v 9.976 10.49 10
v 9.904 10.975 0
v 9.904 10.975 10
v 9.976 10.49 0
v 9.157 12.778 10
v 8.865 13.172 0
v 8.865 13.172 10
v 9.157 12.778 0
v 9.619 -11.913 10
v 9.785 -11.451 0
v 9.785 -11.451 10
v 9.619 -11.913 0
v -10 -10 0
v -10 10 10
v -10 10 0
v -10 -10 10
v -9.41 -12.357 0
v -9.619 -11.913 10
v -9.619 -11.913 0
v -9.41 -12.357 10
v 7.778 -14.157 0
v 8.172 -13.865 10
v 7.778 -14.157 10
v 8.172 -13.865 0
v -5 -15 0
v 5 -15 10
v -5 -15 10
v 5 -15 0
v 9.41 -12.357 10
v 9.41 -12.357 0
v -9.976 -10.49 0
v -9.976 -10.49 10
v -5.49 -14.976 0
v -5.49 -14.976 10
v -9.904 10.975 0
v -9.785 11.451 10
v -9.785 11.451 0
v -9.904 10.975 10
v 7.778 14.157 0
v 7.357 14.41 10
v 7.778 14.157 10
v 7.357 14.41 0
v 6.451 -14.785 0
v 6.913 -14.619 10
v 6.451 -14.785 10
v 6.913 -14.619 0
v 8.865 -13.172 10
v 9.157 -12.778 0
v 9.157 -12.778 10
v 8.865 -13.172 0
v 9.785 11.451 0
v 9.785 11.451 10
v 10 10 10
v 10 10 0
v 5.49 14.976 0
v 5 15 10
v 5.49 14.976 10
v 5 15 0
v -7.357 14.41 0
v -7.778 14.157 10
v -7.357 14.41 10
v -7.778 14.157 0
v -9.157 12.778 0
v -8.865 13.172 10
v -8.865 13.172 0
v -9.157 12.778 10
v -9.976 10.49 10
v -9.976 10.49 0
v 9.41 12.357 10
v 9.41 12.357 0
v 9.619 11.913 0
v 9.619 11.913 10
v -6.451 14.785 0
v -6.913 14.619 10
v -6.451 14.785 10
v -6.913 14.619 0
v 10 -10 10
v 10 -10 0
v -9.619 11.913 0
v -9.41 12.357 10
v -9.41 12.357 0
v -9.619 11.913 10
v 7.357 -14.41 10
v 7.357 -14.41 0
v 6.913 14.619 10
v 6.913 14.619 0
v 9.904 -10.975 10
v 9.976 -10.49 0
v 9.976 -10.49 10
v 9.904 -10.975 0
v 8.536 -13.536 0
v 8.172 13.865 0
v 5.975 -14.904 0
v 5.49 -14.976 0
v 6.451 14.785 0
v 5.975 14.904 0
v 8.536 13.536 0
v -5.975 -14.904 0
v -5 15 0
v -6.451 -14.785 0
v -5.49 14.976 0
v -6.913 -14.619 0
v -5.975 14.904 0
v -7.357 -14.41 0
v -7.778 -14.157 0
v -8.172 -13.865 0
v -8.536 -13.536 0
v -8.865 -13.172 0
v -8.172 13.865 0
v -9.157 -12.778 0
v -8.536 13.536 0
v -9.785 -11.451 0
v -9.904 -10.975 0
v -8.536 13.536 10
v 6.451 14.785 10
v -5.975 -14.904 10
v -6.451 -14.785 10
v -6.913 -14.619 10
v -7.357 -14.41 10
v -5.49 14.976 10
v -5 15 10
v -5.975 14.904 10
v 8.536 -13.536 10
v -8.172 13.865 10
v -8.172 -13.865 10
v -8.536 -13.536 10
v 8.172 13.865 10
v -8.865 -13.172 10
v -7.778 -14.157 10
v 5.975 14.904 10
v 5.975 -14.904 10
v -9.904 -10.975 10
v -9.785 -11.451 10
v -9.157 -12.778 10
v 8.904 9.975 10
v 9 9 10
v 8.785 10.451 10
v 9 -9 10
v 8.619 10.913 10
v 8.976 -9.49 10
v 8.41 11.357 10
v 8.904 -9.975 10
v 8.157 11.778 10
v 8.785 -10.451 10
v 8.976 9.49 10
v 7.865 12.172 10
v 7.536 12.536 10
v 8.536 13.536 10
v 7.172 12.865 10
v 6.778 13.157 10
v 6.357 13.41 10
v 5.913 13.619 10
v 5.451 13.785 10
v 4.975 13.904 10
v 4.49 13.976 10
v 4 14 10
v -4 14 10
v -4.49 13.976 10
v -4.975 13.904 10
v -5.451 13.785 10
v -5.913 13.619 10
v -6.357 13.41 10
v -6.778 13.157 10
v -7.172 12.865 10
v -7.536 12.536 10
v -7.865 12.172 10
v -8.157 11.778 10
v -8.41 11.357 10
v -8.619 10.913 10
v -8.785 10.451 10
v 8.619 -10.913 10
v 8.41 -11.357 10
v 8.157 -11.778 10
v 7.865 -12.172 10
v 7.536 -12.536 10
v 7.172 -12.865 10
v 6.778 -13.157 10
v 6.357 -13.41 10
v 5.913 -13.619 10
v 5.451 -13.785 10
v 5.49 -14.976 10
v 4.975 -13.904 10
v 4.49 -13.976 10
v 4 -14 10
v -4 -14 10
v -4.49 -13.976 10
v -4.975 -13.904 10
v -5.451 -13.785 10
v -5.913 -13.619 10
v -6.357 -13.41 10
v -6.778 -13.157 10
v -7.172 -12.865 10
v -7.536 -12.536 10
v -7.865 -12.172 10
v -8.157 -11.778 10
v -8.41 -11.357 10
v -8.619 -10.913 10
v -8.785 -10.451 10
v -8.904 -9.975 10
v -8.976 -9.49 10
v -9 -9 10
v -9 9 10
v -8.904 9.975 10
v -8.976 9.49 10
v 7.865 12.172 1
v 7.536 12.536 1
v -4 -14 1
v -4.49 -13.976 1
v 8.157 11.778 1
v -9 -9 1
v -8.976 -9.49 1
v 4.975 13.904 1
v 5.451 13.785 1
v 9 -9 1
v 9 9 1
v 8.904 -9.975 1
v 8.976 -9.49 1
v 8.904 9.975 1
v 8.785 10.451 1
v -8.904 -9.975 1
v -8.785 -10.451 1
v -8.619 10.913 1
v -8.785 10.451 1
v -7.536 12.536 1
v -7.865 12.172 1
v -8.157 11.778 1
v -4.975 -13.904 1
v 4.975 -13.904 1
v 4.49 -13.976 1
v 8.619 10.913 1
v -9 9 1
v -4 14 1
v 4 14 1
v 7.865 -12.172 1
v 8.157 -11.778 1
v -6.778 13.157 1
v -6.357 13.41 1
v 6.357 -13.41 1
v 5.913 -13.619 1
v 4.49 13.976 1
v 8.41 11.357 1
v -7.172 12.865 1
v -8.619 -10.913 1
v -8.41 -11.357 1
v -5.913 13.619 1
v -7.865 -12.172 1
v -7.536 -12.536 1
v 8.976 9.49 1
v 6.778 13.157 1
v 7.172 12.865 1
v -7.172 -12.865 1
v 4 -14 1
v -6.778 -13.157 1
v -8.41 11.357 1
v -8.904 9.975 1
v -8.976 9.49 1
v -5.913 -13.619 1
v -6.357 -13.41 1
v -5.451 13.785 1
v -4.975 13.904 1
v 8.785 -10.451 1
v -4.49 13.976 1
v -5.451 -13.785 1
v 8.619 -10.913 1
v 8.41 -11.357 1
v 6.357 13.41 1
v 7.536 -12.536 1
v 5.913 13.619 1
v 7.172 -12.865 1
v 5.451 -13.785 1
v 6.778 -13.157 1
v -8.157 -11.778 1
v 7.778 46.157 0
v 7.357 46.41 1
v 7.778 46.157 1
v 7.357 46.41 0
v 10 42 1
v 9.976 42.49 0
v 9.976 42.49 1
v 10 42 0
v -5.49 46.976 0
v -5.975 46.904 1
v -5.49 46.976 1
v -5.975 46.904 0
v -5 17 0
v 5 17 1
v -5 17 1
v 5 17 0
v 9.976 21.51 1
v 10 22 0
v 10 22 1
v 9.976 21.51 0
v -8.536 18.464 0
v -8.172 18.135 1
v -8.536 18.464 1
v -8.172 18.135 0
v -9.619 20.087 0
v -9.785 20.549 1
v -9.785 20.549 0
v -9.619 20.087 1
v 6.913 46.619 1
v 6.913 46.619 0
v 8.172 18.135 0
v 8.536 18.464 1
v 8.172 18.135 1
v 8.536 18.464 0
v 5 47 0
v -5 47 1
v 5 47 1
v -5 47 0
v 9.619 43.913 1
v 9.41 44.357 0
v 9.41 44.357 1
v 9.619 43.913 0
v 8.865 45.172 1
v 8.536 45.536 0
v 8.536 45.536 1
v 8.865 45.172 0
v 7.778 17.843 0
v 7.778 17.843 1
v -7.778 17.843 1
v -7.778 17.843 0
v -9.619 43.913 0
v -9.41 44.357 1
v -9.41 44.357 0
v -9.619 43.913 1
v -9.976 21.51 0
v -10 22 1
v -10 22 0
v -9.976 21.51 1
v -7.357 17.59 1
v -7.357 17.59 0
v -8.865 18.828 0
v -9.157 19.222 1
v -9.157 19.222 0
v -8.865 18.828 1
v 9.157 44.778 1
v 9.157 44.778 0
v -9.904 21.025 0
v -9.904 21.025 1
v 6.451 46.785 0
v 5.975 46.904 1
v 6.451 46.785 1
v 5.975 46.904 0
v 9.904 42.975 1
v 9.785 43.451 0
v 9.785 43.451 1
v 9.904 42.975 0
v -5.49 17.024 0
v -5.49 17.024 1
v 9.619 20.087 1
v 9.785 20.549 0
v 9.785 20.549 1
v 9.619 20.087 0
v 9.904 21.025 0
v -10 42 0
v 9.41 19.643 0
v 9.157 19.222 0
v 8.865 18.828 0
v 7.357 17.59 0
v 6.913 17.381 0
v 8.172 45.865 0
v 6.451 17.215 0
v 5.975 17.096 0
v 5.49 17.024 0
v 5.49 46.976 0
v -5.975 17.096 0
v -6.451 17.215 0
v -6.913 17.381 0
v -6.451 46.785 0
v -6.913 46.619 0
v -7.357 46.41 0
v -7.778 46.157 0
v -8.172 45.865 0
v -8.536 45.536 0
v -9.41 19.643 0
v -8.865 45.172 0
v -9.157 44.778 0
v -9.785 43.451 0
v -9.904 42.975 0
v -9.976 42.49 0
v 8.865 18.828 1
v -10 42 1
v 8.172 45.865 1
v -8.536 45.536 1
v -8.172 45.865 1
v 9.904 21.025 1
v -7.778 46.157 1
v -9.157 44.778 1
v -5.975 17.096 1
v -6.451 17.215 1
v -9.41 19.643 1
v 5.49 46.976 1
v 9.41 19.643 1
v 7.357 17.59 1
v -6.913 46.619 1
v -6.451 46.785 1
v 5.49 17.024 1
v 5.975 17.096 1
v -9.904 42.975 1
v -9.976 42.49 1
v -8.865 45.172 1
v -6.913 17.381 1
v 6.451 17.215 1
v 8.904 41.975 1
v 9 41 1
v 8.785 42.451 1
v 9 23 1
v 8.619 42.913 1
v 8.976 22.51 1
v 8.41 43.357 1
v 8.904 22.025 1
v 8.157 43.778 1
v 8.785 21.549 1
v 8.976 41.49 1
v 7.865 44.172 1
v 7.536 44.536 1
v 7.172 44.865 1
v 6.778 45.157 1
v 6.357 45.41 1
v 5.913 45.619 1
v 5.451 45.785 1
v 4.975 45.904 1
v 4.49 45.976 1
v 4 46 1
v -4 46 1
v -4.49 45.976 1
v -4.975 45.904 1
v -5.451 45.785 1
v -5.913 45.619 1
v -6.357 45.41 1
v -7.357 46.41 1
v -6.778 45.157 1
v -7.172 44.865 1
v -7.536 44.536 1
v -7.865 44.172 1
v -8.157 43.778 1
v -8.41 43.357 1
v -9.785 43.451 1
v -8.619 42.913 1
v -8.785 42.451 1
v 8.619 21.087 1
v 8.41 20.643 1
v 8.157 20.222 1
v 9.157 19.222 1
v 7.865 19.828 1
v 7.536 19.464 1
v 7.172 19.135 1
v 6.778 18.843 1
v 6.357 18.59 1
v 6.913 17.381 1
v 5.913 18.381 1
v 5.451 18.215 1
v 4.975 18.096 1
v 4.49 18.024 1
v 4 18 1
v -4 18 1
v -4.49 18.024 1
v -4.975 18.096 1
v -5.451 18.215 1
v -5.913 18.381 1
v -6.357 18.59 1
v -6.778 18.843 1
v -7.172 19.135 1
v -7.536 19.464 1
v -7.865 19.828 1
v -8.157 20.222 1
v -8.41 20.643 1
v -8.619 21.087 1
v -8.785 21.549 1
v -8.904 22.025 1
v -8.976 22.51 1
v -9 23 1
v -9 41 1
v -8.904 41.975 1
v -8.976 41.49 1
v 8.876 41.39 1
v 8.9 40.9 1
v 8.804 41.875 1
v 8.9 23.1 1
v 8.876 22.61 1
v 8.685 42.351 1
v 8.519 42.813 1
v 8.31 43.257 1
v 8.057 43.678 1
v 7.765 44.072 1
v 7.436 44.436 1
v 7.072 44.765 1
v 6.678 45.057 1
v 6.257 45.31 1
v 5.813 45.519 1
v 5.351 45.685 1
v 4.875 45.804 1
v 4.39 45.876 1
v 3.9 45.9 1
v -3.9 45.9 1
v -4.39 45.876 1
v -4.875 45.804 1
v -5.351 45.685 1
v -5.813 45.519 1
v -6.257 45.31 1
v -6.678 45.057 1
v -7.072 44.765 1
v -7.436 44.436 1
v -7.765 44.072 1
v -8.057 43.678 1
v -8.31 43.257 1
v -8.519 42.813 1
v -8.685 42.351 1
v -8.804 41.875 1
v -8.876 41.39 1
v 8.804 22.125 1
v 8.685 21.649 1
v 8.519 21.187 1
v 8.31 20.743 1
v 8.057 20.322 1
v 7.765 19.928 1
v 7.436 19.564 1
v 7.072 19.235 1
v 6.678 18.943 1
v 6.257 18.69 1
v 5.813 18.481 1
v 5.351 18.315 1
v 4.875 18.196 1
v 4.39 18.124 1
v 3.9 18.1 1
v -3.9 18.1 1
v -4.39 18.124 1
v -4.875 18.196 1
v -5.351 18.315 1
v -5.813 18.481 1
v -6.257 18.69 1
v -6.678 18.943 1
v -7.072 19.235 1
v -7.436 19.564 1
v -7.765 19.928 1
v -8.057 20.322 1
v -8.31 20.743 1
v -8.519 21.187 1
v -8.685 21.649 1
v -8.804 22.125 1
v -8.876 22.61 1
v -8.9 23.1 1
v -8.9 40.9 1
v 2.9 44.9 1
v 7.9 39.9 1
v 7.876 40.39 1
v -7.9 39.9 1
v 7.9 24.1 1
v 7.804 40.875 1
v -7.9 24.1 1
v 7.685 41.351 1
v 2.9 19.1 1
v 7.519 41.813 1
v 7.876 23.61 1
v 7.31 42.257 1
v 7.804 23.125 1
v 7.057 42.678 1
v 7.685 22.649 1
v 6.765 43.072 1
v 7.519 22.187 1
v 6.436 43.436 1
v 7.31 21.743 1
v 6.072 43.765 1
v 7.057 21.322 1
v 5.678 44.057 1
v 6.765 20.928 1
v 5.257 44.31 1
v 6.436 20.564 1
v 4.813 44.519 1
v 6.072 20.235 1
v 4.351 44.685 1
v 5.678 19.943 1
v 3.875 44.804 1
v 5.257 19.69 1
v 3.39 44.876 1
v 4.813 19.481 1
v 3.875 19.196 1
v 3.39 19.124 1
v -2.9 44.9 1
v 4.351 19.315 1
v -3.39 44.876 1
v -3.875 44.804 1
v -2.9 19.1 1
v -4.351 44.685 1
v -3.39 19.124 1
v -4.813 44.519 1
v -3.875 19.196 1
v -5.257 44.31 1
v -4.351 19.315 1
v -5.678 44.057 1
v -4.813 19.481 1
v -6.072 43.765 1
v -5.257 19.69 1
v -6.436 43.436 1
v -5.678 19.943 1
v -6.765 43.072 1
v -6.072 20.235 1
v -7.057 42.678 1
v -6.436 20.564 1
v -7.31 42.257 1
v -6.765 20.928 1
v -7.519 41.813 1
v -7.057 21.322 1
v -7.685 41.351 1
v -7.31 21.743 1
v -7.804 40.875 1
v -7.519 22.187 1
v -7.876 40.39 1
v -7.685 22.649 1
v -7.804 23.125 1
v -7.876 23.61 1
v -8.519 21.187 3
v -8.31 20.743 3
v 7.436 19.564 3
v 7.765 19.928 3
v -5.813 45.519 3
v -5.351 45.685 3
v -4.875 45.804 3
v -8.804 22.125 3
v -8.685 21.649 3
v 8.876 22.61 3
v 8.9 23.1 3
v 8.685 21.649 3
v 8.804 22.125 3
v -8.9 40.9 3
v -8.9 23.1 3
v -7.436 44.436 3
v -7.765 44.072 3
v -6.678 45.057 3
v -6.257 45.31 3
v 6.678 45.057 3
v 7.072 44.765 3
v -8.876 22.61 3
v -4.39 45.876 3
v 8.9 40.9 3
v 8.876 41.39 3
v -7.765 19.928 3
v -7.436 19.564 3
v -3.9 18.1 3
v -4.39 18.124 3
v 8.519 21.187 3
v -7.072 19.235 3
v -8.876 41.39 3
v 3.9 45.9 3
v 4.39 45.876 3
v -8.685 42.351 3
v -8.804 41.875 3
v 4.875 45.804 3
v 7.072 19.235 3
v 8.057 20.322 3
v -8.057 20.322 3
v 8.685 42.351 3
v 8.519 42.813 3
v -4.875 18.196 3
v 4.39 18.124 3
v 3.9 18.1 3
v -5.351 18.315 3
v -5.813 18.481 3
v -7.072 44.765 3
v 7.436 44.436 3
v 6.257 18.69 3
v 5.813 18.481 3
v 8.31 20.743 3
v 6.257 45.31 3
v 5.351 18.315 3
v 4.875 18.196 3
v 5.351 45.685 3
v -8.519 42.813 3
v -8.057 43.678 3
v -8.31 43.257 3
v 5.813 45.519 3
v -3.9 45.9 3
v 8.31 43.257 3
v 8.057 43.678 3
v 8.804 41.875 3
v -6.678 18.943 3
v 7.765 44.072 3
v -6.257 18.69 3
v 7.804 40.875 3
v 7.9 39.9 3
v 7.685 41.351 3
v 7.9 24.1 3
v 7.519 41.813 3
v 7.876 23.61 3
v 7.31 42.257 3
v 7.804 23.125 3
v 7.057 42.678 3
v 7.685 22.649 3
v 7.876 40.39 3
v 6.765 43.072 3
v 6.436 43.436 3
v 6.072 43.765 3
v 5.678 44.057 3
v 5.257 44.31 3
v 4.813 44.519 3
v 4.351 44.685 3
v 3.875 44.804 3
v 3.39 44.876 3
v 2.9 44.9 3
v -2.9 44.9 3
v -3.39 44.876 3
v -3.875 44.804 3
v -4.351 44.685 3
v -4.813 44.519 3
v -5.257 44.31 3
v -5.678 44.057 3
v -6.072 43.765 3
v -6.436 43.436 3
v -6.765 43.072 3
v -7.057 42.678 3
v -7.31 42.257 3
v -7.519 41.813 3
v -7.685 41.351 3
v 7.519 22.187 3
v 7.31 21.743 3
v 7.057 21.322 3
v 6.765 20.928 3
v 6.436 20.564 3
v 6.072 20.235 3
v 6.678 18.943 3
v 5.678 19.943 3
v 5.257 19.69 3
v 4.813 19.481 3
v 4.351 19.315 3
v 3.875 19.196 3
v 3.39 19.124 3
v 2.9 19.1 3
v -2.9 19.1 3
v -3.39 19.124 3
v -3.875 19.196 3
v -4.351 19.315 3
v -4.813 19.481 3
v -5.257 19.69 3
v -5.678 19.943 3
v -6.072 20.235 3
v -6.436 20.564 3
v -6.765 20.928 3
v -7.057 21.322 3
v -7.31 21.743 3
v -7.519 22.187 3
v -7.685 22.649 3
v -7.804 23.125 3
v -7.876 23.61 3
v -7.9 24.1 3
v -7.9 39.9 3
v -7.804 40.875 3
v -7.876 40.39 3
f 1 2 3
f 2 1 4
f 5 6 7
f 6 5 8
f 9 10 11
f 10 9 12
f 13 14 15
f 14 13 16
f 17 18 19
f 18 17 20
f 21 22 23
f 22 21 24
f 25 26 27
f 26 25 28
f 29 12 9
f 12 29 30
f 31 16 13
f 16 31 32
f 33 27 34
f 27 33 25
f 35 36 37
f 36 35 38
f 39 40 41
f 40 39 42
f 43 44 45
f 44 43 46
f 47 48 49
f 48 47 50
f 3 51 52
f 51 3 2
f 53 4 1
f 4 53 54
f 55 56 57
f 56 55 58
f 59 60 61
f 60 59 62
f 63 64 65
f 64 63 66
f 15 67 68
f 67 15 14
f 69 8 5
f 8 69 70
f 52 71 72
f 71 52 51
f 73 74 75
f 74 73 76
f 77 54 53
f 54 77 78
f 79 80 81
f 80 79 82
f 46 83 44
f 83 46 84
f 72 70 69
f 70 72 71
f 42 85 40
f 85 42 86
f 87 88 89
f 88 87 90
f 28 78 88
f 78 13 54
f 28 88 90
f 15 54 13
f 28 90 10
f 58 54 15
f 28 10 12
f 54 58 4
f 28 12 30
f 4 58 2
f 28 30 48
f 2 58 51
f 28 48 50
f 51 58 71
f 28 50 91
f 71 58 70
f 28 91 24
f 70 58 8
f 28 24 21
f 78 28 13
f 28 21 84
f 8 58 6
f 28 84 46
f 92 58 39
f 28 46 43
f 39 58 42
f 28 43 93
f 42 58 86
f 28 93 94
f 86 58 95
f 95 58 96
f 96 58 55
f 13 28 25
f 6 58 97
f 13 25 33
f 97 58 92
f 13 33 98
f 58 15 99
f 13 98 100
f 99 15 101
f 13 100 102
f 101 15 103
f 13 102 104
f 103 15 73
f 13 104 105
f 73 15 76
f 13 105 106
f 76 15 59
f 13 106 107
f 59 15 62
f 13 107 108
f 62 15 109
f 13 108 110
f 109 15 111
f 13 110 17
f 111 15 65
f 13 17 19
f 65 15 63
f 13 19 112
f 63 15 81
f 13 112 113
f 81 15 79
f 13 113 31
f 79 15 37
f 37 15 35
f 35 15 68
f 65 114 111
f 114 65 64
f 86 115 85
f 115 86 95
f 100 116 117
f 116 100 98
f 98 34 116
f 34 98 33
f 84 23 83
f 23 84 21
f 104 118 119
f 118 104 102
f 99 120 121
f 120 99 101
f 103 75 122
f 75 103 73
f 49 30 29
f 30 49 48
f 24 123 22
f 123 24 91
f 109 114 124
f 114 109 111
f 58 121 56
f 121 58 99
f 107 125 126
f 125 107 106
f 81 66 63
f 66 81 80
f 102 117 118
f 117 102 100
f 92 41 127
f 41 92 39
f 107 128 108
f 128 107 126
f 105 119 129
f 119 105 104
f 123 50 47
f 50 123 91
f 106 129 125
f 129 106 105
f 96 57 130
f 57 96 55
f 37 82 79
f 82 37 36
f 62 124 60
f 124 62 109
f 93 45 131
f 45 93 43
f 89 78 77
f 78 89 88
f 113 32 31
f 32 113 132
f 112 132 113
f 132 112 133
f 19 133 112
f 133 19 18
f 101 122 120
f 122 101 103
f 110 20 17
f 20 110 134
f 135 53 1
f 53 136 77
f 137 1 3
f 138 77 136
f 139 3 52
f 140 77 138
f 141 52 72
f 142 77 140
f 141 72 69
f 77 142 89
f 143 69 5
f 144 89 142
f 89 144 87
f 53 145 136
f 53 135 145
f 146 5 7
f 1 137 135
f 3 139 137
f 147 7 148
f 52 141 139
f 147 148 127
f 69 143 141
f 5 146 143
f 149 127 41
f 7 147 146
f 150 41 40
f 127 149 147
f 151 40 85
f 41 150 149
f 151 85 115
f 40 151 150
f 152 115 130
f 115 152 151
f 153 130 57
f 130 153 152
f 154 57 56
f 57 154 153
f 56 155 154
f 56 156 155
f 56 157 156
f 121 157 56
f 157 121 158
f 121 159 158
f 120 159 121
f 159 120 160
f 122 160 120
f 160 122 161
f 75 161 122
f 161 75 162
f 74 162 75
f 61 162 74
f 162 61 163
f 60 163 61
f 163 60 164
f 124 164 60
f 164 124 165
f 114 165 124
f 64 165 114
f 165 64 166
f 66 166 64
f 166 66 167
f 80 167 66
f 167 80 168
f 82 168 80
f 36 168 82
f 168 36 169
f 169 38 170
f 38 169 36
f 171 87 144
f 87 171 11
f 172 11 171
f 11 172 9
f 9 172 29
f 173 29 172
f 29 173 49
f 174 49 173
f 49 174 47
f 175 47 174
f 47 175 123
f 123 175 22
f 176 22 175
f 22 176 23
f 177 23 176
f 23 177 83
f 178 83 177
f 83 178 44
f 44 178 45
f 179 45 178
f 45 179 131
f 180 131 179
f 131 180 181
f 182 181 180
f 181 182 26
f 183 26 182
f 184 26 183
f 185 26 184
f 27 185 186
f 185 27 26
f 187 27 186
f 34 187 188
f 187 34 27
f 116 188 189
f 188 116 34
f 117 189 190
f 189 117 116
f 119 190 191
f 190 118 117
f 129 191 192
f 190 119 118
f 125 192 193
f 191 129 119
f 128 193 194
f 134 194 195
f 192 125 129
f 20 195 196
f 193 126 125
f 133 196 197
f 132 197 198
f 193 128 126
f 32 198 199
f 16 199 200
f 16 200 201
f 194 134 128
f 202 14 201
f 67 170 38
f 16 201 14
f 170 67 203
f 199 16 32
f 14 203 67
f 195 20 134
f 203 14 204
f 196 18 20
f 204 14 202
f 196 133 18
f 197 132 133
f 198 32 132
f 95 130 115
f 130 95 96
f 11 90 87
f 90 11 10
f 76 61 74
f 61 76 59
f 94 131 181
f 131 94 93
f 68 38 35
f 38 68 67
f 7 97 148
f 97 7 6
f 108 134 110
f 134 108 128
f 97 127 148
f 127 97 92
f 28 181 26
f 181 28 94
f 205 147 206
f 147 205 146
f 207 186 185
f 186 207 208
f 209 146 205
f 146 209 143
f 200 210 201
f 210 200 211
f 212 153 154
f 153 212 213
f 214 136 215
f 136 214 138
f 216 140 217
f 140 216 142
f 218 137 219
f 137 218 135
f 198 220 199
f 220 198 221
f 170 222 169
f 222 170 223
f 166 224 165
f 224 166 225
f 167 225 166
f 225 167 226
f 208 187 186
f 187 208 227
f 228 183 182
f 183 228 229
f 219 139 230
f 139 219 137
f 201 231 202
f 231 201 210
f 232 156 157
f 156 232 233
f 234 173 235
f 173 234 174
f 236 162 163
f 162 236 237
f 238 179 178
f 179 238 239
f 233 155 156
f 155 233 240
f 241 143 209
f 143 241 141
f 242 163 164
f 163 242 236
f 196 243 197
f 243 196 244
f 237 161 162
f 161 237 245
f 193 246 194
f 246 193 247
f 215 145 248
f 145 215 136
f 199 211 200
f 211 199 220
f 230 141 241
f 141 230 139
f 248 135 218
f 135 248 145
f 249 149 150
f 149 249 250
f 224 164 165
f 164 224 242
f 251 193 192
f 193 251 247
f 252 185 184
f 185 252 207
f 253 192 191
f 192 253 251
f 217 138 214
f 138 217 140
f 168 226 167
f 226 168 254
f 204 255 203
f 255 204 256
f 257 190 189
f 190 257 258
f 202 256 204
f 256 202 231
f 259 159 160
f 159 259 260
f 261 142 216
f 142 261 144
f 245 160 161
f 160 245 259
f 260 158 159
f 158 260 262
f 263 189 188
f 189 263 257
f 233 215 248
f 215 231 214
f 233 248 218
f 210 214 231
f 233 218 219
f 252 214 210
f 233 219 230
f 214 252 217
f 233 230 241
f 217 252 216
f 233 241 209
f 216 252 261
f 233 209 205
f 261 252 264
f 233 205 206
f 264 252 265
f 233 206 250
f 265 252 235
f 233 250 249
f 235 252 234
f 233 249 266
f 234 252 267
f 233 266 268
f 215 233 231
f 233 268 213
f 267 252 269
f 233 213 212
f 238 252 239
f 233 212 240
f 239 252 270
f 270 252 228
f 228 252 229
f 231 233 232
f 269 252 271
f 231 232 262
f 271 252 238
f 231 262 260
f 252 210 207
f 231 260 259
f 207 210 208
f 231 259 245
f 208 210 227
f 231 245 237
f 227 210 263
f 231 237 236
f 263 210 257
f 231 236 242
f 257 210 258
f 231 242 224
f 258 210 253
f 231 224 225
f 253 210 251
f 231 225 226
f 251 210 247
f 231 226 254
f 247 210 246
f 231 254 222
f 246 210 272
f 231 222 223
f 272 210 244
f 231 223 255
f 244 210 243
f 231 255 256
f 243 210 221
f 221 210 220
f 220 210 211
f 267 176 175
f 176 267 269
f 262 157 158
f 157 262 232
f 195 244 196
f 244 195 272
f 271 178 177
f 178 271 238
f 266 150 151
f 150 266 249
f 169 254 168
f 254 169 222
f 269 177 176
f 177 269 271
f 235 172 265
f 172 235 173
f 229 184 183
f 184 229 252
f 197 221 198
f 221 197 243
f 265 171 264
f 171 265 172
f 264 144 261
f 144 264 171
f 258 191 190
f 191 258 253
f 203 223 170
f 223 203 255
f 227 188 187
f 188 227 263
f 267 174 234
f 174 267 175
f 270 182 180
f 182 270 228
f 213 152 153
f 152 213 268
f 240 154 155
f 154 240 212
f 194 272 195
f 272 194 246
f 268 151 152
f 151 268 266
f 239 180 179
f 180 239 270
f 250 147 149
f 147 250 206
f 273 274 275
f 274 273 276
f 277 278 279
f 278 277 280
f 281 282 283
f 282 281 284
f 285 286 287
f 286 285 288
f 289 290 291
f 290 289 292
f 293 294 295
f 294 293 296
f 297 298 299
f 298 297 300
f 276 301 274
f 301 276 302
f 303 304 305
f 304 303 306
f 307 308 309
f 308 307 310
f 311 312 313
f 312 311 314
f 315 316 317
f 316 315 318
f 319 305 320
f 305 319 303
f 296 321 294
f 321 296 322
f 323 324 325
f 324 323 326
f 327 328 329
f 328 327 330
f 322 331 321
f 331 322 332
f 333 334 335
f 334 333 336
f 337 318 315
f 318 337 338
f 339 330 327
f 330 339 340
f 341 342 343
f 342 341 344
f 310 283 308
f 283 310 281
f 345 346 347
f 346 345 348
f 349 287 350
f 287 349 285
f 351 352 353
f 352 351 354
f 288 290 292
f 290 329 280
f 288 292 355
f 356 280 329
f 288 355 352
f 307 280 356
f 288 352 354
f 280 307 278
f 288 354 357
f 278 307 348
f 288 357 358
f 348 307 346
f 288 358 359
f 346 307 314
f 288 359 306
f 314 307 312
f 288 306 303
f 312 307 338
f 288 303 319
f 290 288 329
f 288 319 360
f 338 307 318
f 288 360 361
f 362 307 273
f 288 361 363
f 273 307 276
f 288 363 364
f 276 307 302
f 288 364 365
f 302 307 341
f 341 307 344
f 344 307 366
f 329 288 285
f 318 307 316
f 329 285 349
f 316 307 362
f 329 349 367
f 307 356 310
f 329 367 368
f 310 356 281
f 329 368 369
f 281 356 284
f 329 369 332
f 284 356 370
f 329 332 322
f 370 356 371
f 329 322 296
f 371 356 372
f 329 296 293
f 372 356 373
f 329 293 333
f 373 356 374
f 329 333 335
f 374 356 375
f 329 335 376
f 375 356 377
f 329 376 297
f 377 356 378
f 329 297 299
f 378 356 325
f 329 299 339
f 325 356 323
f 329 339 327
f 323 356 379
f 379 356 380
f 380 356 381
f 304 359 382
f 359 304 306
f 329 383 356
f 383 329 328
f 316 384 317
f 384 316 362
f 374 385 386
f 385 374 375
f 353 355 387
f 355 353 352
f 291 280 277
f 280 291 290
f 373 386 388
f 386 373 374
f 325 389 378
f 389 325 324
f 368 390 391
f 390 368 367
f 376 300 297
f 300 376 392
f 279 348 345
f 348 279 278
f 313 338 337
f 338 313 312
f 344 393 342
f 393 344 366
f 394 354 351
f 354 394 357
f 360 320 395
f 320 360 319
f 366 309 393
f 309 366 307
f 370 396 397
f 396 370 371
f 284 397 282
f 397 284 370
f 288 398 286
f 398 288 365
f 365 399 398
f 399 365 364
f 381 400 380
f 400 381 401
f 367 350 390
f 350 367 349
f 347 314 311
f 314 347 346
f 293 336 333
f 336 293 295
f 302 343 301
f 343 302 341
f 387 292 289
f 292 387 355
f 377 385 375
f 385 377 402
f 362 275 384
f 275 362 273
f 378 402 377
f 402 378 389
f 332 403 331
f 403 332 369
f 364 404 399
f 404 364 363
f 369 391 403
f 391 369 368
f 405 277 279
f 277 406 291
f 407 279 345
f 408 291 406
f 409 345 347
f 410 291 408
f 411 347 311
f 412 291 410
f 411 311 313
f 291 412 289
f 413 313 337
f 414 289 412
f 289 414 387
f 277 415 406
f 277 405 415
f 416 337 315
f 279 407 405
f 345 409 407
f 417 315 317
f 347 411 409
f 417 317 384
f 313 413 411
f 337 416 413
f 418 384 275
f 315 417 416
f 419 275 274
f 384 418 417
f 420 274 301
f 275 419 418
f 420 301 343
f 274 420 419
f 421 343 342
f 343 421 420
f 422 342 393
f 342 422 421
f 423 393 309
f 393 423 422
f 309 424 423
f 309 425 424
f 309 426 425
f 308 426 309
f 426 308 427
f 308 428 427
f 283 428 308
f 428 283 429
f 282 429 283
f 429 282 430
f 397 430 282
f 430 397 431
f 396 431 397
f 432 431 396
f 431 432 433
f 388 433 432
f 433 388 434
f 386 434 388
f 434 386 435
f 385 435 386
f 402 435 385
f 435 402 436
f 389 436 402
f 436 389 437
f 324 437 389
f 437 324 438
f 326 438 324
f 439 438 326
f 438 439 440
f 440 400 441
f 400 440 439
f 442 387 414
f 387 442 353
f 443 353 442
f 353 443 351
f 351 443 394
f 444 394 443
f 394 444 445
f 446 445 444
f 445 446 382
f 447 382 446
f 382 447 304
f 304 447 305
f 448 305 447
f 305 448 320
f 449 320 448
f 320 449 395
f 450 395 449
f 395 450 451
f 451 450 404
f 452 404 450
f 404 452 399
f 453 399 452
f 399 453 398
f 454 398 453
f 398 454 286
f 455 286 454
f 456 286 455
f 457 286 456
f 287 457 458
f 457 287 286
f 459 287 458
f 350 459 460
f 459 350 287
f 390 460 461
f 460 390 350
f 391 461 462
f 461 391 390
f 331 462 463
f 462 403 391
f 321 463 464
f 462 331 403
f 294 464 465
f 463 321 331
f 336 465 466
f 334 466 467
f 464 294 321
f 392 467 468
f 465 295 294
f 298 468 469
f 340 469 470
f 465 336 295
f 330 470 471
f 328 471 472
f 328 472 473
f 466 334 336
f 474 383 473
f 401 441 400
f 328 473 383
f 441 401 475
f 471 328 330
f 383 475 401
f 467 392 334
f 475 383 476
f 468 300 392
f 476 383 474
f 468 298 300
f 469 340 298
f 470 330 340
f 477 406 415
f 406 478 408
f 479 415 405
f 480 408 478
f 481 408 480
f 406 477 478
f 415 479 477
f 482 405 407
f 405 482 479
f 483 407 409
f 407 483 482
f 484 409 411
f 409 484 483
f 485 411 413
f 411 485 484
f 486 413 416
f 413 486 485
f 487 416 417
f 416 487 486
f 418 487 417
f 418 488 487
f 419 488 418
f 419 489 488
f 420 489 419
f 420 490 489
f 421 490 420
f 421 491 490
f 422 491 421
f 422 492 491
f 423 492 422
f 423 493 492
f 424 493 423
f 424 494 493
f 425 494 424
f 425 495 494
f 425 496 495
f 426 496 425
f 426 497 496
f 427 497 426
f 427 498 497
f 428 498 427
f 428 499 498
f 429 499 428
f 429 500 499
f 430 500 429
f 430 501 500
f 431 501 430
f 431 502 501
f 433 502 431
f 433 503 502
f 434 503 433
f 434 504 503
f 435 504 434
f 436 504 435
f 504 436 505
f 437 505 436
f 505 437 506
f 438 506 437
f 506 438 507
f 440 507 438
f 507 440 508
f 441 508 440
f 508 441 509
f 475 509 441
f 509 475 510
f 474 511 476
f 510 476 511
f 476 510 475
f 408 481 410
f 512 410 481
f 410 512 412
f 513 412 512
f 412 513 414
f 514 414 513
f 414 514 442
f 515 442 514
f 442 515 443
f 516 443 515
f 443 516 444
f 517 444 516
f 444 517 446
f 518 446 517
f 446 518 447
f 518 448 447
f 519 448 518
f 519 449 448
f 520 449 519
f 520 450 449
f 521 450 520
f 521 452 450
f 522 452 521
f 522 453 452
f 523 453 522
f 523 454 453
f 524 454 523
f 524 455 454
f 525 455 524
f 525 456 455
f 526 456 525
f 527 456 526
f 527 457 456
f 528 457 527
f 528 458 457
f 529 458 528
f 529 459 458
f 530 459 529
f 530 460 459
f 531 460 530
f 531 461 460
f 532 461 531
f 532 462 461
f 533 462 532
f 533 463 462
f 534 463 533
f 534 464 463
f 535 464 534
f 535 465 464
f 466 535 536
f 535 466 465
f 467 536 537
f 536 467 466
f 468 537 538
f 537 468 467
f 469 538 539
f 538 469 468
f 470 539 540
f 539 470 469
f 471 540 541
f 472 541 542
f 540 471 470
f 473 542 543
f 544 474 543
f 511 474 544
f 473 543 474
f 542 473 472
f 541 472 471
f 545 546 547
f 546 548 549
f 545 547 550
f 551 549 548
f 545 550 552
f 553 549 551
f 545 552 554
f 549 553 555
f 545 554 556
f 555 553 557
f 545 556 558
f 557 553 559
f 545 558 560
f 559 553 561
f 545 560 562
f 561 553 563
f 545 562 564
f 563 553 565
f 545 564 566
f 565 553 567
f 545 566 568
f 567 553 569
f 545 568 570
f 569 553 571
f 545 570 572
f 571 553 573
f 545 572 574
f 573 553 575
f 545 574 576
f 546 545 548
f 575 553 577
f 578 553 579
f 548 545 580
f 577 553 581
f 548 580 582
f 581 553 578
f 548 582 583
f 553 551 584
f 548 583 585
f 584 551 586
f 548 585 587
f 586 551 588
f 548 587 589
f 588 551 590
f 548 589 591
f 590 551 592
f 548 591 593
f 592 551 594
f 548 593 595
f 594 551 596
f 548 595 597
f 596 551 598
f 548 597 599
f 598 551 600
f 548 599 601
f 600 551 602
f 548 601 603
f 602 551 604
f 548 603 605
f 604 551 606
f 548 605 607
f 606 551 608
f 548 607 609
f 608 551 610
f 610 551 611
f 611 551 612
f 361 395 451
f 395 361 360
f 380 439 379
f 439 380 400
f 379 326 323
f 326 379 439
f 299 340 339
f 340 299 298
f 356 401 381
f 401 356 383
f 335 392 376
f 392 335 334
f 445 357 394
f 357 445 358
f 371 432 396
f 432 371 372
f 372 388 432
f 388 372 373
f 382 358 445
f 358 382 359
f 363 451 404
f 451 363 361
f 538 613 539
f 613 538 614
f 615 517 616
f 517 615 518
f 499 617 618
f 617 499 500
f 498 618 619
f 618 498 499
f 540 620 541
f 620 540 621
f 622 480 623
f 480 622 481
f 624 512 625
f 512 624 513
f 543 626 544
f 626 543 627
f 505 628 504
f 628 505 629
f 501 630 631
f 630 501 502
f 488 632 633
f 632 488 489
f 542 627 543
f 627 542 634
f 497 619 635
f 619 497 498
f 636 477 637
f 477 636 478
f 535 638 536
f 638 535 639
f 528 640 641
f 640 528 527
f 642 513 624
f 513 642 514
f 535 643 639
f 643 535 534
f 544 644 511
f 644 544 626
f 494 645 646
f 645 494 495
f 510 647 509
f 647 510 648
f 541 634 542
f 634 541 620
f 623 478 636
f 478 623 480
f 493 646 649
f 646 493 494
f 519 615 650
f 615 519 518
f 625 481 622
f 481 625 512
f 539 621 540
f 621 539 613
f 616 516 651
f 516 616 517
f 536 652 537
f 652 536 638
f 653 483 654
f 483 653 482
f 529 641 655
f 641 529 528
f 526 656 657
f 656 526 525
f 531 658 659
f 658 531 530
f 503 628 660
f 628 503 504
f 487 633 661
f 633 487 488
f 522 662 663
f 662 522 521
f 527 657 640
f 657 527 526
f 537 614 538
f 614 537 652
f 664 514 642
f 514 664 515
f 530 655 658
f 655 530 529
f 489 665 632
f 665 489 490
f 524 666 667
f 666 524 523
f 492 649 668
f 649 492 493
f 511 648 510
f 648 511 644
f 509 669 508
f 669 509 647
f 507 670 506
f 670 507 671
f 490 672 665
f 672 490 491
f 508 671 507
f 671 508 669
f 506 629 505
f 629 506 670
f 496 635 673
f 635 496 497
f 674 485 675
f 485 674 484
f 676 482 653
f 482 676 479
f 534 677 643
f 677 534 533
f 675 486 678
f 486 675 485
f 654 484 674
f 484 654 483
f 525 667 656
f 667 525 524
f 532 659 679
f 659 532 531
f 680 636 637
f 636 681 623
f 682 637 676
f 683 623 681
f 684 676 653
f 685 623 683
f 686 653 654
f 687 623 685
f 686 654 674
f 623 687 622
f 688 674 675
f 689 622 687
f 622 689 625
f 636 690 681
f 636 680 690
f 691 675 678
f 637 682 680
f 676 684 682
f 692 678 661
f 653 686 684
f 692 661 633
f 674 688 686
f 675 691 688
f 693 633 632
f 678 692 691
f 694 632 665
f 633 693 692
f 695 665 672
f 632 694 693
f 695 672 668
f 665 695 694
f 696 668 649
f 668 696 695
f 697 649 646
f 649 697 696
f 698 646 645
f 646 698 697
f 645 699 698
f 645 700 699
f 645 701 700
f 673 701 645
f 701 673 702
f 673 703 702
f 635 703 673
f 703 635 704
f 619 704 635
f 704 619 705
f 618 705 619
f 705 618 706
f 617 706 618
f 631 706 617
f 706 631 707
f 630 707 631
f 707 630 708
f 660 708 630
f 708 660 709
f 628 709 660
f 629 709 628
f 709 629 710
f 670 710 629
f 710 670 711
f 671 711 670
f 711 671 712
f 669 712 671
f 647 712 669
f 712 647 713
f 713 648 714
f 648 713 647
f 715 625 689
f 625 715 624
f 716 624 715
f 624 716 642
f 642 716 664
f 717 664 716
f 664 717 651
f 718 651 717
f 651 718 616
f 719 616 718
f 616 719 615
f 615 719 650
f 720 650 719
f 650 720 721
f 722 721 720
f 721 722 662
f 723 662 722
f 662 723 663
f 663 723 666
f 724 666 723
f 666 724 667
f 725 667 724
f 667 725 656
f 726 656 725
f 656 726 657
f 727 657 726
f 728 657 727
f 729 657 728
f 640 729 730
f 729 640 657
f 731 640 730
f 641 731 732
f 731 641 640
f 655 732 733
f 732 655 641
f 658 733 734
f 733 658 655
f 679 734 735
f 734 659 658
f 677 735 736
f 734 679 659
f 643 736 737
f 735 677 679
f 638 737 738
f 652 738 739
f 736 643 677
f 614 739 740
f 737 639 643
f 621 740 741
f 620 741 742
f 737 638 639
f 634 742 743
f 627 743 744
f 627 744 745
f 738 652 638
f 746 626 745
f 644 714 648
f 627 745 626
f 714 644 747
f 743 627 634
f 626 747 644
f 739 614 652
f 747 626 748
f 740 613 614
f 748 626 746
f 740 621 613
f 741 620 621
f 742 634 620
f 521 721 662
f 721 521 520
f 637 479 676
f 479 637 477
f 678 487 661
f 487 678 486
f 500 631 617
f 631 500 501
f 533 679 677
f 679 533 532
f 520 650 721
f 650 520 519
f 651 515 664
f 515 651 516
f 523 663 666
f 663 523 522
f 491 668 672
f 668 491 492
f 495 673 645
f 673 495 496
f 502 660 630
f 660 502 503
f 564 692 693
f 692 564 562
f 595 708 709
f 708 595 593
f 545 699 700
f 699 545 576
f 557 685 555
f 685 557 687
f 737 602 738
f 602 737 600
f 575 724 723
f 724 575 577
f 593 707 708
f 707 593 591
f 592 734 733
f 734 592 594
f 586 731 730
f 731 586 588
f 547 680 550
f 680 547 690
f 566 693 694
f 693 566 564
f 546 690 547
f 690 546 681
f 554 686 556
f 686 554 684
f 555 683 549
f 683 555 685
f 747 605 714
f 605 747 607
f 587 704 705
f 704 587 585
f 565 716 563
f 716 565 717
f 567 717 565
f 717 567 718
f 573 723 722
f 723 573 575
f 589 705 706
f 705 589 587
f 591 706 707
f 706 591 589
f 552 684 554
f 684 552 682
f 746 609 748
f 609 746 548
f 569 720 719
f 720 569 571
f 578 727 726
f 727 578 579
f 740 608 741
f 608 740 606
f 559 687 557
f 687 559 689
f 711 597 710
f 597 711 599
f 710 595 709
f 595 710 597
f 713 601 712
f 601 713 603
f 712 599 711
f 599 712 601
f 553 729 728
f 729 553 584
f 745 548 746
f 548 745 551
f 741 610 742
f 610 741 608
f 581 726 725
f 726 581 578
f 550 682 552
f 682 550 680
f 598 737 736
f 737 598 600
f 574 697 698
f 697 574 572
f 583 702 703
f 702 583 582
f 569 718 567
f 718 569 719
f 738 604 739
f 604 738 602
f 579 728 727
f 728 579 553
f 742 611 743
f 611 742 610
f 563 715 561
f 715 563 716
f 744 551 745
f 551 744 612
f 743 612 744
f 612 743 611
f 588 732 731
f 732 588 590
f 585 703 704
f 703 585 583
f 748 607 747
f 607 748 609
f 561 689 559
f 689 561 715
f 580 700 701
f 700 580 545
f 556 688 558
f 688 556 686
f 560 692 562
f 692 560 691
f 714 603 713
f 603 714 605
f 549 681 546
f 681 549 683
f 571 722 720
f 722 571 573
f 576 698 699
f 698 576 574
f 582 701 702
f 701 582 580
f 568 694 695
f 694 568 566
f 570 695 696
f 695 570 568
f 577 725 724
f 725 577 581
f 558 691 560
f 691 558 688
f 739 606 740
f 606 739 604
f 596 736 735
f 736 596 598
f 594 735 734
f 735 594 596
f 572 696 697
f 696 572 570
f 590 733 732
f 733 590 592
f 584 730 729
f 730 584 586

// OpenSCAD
//------------------------------------------------------------------------------------------
// THIS CODE WAS GENERATED WITH GRAPHSCAD
//------------------------------------------------------------------------------------------
// Graphscad is a graphical nodal editor to create .SCAD files
//
// More info : http://graphscad.free.fr
//
// Scad Files created with Graphscad can be edited by graphscad
// Scad Files created with Graphscad can be read by Openscad
//
//------------------------------------------------------------------------------------------
module custombox(x=20,y=30,z=10,tickness=1,rounding=5)
{
 function node_box_matrix(i=0,j=0,k=0,l=0,m=0,n=0) = translate([0,0,0]);
 module node_box(i=0,j=0,k=0,l=0,m=0,n=0)
 {
  difference()
  {
   hull()
   {
    translate([-((((x)/2))-(rounding)),-((((y)/2))-(rounding)),0]) cylinder(r=rounding,h=(z),$fn=64);
    translate([-((((x)/2))-(rounding)), ((((y)/2))-(rounding)),0]) cylinder(r=rounding,h=(z),$fn=64);
    translate([ ((((x)/2))-(rounding)),-((((y)/2))-(rounding)),0]) cylinder(r=rounding,h=(z),$fn=64);
    translate([ ((((x)/2))-(rounding)), ((((y)/2))-(rounding)),0]) cylinder(r=rounding,h=(z),$fn=64);
   }
   translate([ 0,0,1])hull()
   {
    translate([-((((x)/2))-((rounding)+(tickness))),-((((y)/2))-((rounding)+(tickness))),0]) cylinder(r=rounding,h=(((z))-(1)+0.01),$fn=64);
    translate([-((((x)/2))-((rounding)+(tickness))), ((((y)/2))-((rounding)+(tickness))),0]) cylinder(r=rounding,h=(((z))-(1)+0.01),$fn=64);
    translate([ ((((x)/2))-((rounding)+(tickness))),-((((y)/2))-((rounding)+(tickness))),0]) cylinder(r=rounding,h=(((z))-(1)+0.01),$fn=64);
    translate([ ((((x)/2))-((rounding)+(tickness))), ((((y)/2))-((rounding)+(tickness))),0]) cylinder(r=rounding,h=(((z))-(1)+0.01),$fn=64);
   }
  }
 }
 function node_box0_matrix(i=0,j=0,k=0,l=0,m=0,n=0) = translate([0,y+2,tickness]);
 module node_box0(i=0,j=0,k=0,l=0,m=0,n=0)
 {
  translate([0,y+2,tickness])difference()
  {
   hull()
   {
    translate([-((((x-tickness*2-0.2)/2))-(rounding)),-((((y-tickness*2-0.2)/2))-(rounding)),0]) cylinder(r=rounding,h=(tickness*2),$fn=64);
    translate([-((((x-tickness*2-0.2)/2))-(rounding)), ((((y-tickness*2-0.2)/2))-(rounding)),0]) cylinder(r=rounding,h=(tickness*2),$fn=64);
    translate([ ((((x-tickness*2-0.2)/2))-(rounding)),-((((y-tickness*2-0.2)/2))-(rounding)),0]) cylinder(r=rounding,h=(tickness*2),$fn=64);
    translate([ ((((x-tickness*2-0.2)/2))-(rounding)), ((((y-tickness*2-0.2)/2))-(rounding)),0]) cylinder(r=rounding,h=(tickness*2),$fn=64);
   }
   translate([ 0,0,0])hull()
   {
    translate([-((((x-tickness*2-0.2)/2))-((rounding)+(tickness))),-((((y-tickness*2-0.2)/2))-((rounding)+(tickness))),0]) cylinder(r=rounding,h=(((tickness*2))-(0)+0.01),$fn=64);
    translate([-((((x-tickness*2-0.2)/2))-((rounding)+(tickness))), ((((y-tickness*2-0.2)/2))-((rounding)+(tickness))),0]) cylinder(r=rounding,h=(((tickness*2))-(0)+0.01),$fn=64);
    translate([ ((((x-tickness*2-0.2)/2))-((rounding)+(tickness))),-((((y-tickness*2-0.2)/2))-((rounding)+(tickness))),0]) cylinder(r=rounding,h=(((tickness*2))-(0)+0.01),$fn=64);
    translate([ ((((x-tickness*2-0.2)/2))-((rounding)+(tickness))), ((((y-tickness*2-0.2)/2))-((rounding)+(tickness))),0]) cylinder(r=rounding,h=(((tickness*2))-(0)+0.01),$fn=64);
   }
  }
 }
 function node_box1_matrix(i=0,j=0,k=0,l=0,m=0,n=0) = translate([0,y+2,0]);
 module node_box1(i=0,j=0,k=0,l=0,m=0,n=0)
 {
  translate([0,y+2,0])difference()
  {
   hull()
   {
    translate([-((((x)/2))-(rounding)),-((((y)/2))-(rounding)),0]) cylinder(r=rounding,h=(tickness),$fn=64);
    translate([-((((x)/2))-(rounding)), ((((y)/2))-(rounding)),0]) cylinder(r=rounding,h=(tickness),$fn=64);
    translate([ ((((x)/2))-(rounding)),-((((y)/2))-(rounding)),0]) cylinder(r=rounding,h=(tickness),$fn=64);
    translate([ ((((x)/2))-(rounding)), ((((y)/2))-(rounding)),0]) cylinder(r=rounding,h=(tickness),$fn=64);
   }
   translate([ 0,0,tickness])hull()
   {
    translate([-((((x)/2))-((rounding)+(tickness))),-((((y)/2))-((rounding)+(tickness))),0]) cylinder(r=rounding,h=(((tickness))-(tickness)+0.01),$fn=64);
    translate([-((((x)/2))-((rounding)+(tickness))), ((((y)/2))-((rounding)+(tickness))),0]) cylinder(r=rounding,h=(((tickness))-(tickness)+0.01),$fn=64);
    translate([ ((((x)/2))-((rounding)+(tickness))),-((((y)/2))-((rounding)+(tickness))),0]) cylinder(r=rounding,h=(((tickness))-(tickness)+0.01),$fn=64);
    translate([ ((((x)/2))-((rounding)+(tickness))), ((((y)/2))-((rounding)+(tickness))),0]) cylinder(r=rounding,h=(((tickness))-(tickness)+0.01),$fn=64);
   }
  }
 }
 function node_boolean_matrix(i=0,j=0,k=0,l=0,m=0,n=0) = node_box_matrix(i=i,j=j,k=k,l=l,m=m,n=n);
 module node_boolean(i=0,j=0,k=0,l=0,m=0,n=0)
 {
  union()
  {
   node_box(i,j,k,l,m,n);
   node_box1(i,j,k,l,m,n);
   node_box0(i,j,k,l,m,n);
  }
 }
 node_boolean();
 /*--------------------------------------------------------------------------------------------------------
  Graphscad Utils functions
  This code is Used By Graphscad Nodal Editor to generate SCAD files
 --------------------------------------------------------------------------------------------------------*/
 function det4x4(a) =
 a[0][0]*a[1][1]*a[2][2]*a[3][3] + a[0][0]*a[1][2]*a[2][3]*a[3][1] + a[0][0]*a[1][3]*a[2][1]*a[3][2]
 + a[0][1]*a[1][0]*a[2][3]*a[3][2] + a[0][1]*a[1][2]*a[2][0]*a[3][3] + a[0][1]*a[1][3]*a[2][2]*a[3][0]
 + a[0][2]*a[1][0]*a[2][1]*a[3][3] + a[0][2]*a[1][1]*a[2][3]*a[3][0] + a[0][2]*a[1][3]*a[2][0]*a[3][1]
 + a[0][3]*a[1][0]*a[2][2]*a[3][1] + a[0][3]*a[1][1]*a[2][0]*a[3][2] + a[0][3]*a[1][2]*a[2][1]*a[3][0]
 - a[0][0]*a[1][1]*a[2][3]*a[3][2] - a[0][0]*a[1][2]*a[2][1]*a[3][3] - a[0][0]*a[1][3]*a[2][2]*a[3][1]
 - a[0][1]*a[1][0]*a[2][2]*a[3][3] - a[0][1]*a[1][2]*a[2][3]*a[3][0] - a[0][1]*a[1][3]*a[2][0]*a[3][2]
 - a[0][2]*a[1][0]*a[2][3]*a[3][1] - a[0][2]*a[1][1]*a[2][0]*a[3][3] - a[0][2]*a[1][3]*a[2][1]*a[3][0]
 - a[0][3]*a[1][0]*a[2][1]*a[3][2] - a[0][3]*a[1][1]*a[2][2]*a[3][0] - a[0][3]*a[1][2]*a[2][0]*a[3][1];
 function invb00(a) = a[1][1]*a[2][2]*a[3][3] + a[1][2]*a[2][3]*a[3][1] + a[1][3]*a[2][1]*a[3][2] - a[1][1]*a[2][3]*a[3][2] - a[1][2]*a[2][1]*a[3][3] - a[1][3]*a[2][2]*a[3][1];
 function invb01(a) = a[0][1]*a[2][3]*a[3][2] + a[0][2]*a[2][1]*a[3][3] + a[0][3]*a[2][2]*a[3][1] - a[0][1]*a[2][2]*a[3][3] - a[0][2]*a[2][3]*a[3][1] - a[0][3]*a[2][1]*a[3][2];
 function invb02(a) = a[0][1]*a[1][2]*a[3][3] + a[0][2]*a[1][3]*a[3][1] + a[0][3]*a[1][1]*a[3][2] - a[0][1]*a[1][3]*a[3][2] - a[0][2]*a[1][1]*a[3][3] - a[0][3]*a[1][2]*a[3][1];
 function invb03(a) = a[0][1]*a[1][3]*a[2][2] + a[0][2]*a[1][1]*a[2][3] + a[0][3]*a[1][2]*a[2][1] - a[0][1]*a[1][2]*a[2][3] - a[0][2]*a[1][3]*a[2][1] - a[0][3]*a[1][1]*a[2][2];
 function invb10(a) = a[1][0]*a[2][3]*a[3][2] + a[1][2]*a[2][0]*a[3][3] + a[1][3]*a[2][2]*a[3][0] - a[1][0]*a[2][2]*a[3][3] - a[1][2]*a[2][3]*a[3][0] - a[1][3]*a[2][0]*a[3][2];
 function invb11(a) = a[0][0]*a[2][2]*a[3][3] + a[0][2]*a[2][3]*a[3][0] + a[0][3]*a[2][0]*a[3][2] - a[0][0]*a[2][3]*a[3][2] - a[0][2]*a[2][0]*a[3][3] - a[0][3]*a[2][2]*a[3][0];
 function invb12(a) = a[0][0]*a[1][3]*a[3][2] + a[0][2]*a[1][0]*a[3][3] + a[0][3]*a[1][2]*a[3][0] - a[0][0]*a[1][2]*a[3][3] - a[0][2]*a[1][3]*a[3][0] - a[0][3]*a[1][0]*a[3][2];
 function invb13(a) = a[0][0]*a[1][2]*a[2][3] + a[0][2]*a[1][3]*a[2][0] + a[0][3]*a[1][0]*a[2][2] - a[0][0]*a[1][3]*a[2][2] - a[0][2]*a[1][0]*a[2][3] - a[0][3]*a[1][2]*a[2][0];
 function invb20(a) = a[1][0]*a[2][1]*a[3][3] + a[1][1]*a[2][3]*a[3][0] + a[1][3]*a[2][0]*a[3][1] - a[1][0]*a[2][3]*a[3][1] - a[1][1]*a[2][0]*a[3][3] - a[1][3]*a[2][1]*a[3][0];
 function invb21(a) = a[0][0]*a[2][3]*a[3][1] + a[0][1]*a[2][0]*a[3][3] + a[0][3]*a[2][1]*a[3][0] - a[0][0]*a[2][1]*a[3][3] - a[0][1]*a[2][3]*a[3][0] - a[0][3]*a[2][0]*a[3][1];
 function invb22(a) = a[0][0]*a[1][1]*a[3][3] + a[0][1]*a[1][3]*a[3][0] + a[0][3]*a[1][0]*a[3][1] - a[0][0]*a[1][3]*a[3][1] - a[0][1]*a[1][0]*a[3][3] - a[0][3]*a[1][1]*a[3][0];
 function invb23(a) = a[0][0]*a[1][3]*a[2][1] + a[0][1]*a[1][0]*a[2][3] + a[0][3]*a[1][1]*a[2][0] - a[0][0]*a[1][1]*a[2][3] - a[0][1]*a[1][3]*a[2][0] - a[0][3]*a[1][0]*a[2][1];
 function invb30(a) = a[1][0]*a[2][2]*a[3][1] + a[1][1]*a[2][0]*a[3][2] + a[1][2]*a[2][1]*a[3][0] - a[1][0]*a[2][1]*a[3][2] - a[1][1]*a[2][2]*a[3][0] - a[1][2]*a[2][0]*a[3][1];
 function invb31(a) = a[0][0]*a[2][1]*a[3][2] + a[0][1]*a[2][2]*a[3][0] + a[0][2]*a[2][0]*a[3][1] - a[0][0]*a[2][2]*a[3][1] - a[0][1]*a[2][0]*a[3][2] - a[0][2]*a[2][1]*a[3][0];
 function invb32(a) = a[0][0]*a[1][2]*a[3][1] + a[0][1]*a[1][0]*a[3][2] + a[0][2]*a[1][1]*a[3][0] - a[0][0]*a[1][1]*a[3][2] - a[0][1]*a[1][2]*a[3][0] - a[0][2]*a[1][0]*a[3][1];
 function invb33(a) = a[0][0]*a[1][1]*a[2][2] + a[0][1]*a[1][2]*a[2][0] + a[0][2]*a[1][0]*a[2][1] - a[0][0]*a[1][2]*a[2][1] - a[0][1]*a[1][0]*a[2][2] - a[0][2]*a[1][1]*a[2][0];
 function inv4x4(a)= (1/det4x4(a))*[
 [invb00(a),invb01(a),invb02(a),invb03(a)],
 [invb10(a),invb11(a),invb12(a),invb13(a)],
 [invb20(a),invb21(a),invb22(a),invb23(a)],
 [invb30(a),invb31(a),invb32(a),invb33(a)]];
 function onlytranslate(a)=  [
                        [1,0,0,a[0][3]],
                        [0,1,0,a[1][3]],
                        [0,0,1,a[2][3]],
                        [0,0,0,1]];
 function negonlytranslate(a)=[
                        [1,0,0,-a[0][3]],
                        [0,1,0,-a[1][3]],
                        [0,0,1,-a[2][3]],
                        [0,0,0,1]];
 function lookatvec(t,parentmat) = [t[0]-parentmat[0][3],
                                 t[1]-parentmat[1][3],
                                 t[2]-parentmat[2][3]];
 /*
              rx = '0'
              ry = 'acos('+tz+'/norm(['+tx+','+ty+','+tz+']))'
              rz = 'atan2('+ty+','+tx+')'
 */
 function lookatrot(t,parentmat) = [0,
                                 acos((t[2]-parentmat[2][3])/norm(lookatvec(t,parentmat))),
                                 atan2(t[1]-parentmat[1][3],t[0]-parentmat[0][3])];
 function gettranslation(m) = [m[0][3],m[1][3],m[2][3]];
 function vectormulmatrix(v,m) = m*v;
 function vectorlength(v) = norm(v);
 function vectorx(v) = v[0];
 function vectory(v) = v[1];
 function vectorz(v) = v[2];
 function vectoradd(a,b) = (a+b);
 function vectorsub(a,b) = (a-b);
 function vectormul(a,b) = (a*b);
 function vectordiv(a,b) = (a*(1/b));
 function scale(v)=[[v[0],0,0,0],
                    [0,v[1],0,0],
                    [0,0,v[2],0],
                    [0,0,0,1]];
 function rotatex(a)=[[1,0,0,0],
                      [0,cos(a),-sin(a),0],
                      [0,sin(a),cos(a),0],
                      [0,0,0,1]];
 function rotatey(a)=[[cos(a),0,sin(a),0],
                      [0,1,0,0],
                      [-sin(a),0,cos(a),0],
                      [0,0,0,1]];
 function rotatez(a)=[[cos(a),-sin(a),0,0],
                      [sin(a),cos(a),0,0],
                      [0,0,1,0],
                      [0,0,0,1]];
 function rotatea(c,s,l,m,n)=[[l*l*(1-c)+c,m*l*(1-c)-n*s,n*l*(1-c)+m*s,0],
                              [l*m*(1-c)+n*s,m*m*(1-c)+c,n*m*(1-c)-l*s,0],
                              [l*n*(1-c)-m*s,m*n*(1-c)+l*s,n*n*(1-c)+c,0],
                              [0,0,0,1]];
 function rotateanv(a,nv)=rotatea(cos(a),sin(a),nv[0],nv[1],nv[2]);
 function rotate(a,v, normV=true)=(v==undef)?rotatez(a[2])*rotatey(a[1])*rotatex(a[0]):
                      normV ? rotateanv(a,v/sqrt(v*v)) : rotateanv(a,v);
 function translate(v)=[[1,0,0,v[0]],
                        [0,1,0,v[1]],
                        [0,0,1,v[2]],
                        [0,0,0,1]];
 function mirrorabc(a,b,c)=[[1-2*a*a,-2*a*b,-2*a*c,0],
                            [-2*a*b,1-2*b*b,-2*b*c,0],
                            [-2*a*c,-2*b*c,1-2*c*c,0],
                            [0,0,0,1]];
 function mirrornv(nv)=mirrorabc(nv[0],nv[1],nv[2]);
 function mirror(v)=mirrornv(v/sqrt(v*v));
}
custombox();


/*BEGINGRAPHSCAD{
    "nodes": [
        {
            "name": "node_box",
            "inputplugs": [
                {
                    "type": "str",
                    "name": "sizex",
                    "value": "x"
                },
                {
                    "type": "str",
                    "name": "sizey",
                    "value": "y"
                },
                {
                    "type": "str",
                    "name": "sizez",
                    "value": "z"
                },
                {
                    "type": "str",
                    "name": "tx",
                    "value": "0"
                },
                {
                    "type": "str",
                    "name": "ty",
                    "value": "0"
                },
                {
                    "type": "str",
                    "name": "tz",
                    "value": "0"
                },
                {
                    "type": "str",
                    "name": "rounding",
                    "value": "rounding"
                },
                {
                    "type": "str",
                    "name": "tickness",
                    "value": "tickness"
                },
                {
                    "type": "str",
                    "name": "interiorheight",
                    "value": "1"
                },
                {
                    "type": "str",
                    "name": "$fn",
                    "value": "64"
                },
                {
                    "type": "str",
                    "name": "center",
                    "value": "true",
                    "combo": [
                        "true",
                        "false"
                    ]
                }
            ],
            "typename": "Node_box",
            "version": 1,
            "y": -256.486,
            "x": -962.5500000000002
        },
        {
            "name": "node_box0",
            "inputplugs": [
                {
                    "type": "str",
                    "name": "sizex",
                    "value": "x-tickness*2-0.2"
                },
                {
                    "type": "str",
                    "name": "sizey",
                    "value": "y-tickness*2-0.2"
                },
                {
                    "type": "str",
                    "name": "sizez",
                    "value": "tickness*2"
                },
                {
                    "type": "str",
                    "name": "tx",
                    "value": "0"
                },
                {
                    "type": "str",
                    "name": "ty",
                    "value": "y+2"
                },
                {
                    "type": "str",
                    "name": "tz",
                    "value": "tickness"
                },
                {
                    "type": "str",
                    "name": "rounding",
                    "value": "rounding"
                },
                {
                    "type": "str",
                    "name": "tickness",
                    "value": "tickness"
                },
                {
                    "type": "str",
                    "name": "interiorheight",
                    "value": "0"
                },
                {
                    "type": "str",
                    "name": "$fn",
                    "value": "64"
                },
                {
                    "type": "str",
                    "name": "center",
                    "value": "true",
                    "combo": [
                        "true",
                        "false"
                    ]
                }
            ],
            "typename": "Node_box",
            "version": 1,
            "y": 351.20264000000003,
            "x": -946.0540799999999
        },
        {
            "name": "node_box1",
            "inputplugs": [
                {
                    "type": "str",
                    "name": "sizex",
                    "value": "x"
                },
                {
                    "type": "str",
                    "name": "sizey",
                    "value": "y"
                },
                {
                    "type": "str",
                    "name": "sizez",
                    "value": "tickness"
                },
                {
                    "type": "str",
                    "name": "tx",
                    "value": "0"
                },
                {
                    "type": "str",
                    "name": "ty",
                    "value": "y+2"
                },
                {
                    "type": "str",
                    "name": "tz",
                    "value": "0"
                },
                {
                    "type": "str",
                    "name": "rounding",
                    "value": "rounding"
                },
                {
                    "type": "str",
                    "name": "tickness",
                    "value": "tickness"
                },
                {
                    "type": "str",
                    "name": "interiorheight",
                    "value": "tickness"
                },
                {
                    "type": "str",
                    "name": "$fn",
                    "value": "64"
                },
                {
                    "type": "str",
                    "name": "center",
                    "value": "true",
                    "combo": [
                        "true",
                        "false"
                    ]
                }
            ],
            "typename": "Node_box",
            "version": 1,
            "y": 45.80064000000013,
            "x": -955.9440800000002
        },
        {
            "name": "node_boolean",
            "inputplugs": [
                {
                    "type": "str",
                    "name": "op",
                    "value": "union",
                    "combo": [
                        "difference",
                        "union",
                        "intersection"
                    ]
                },
                {
                    "type": "str",
                    "name": "tx",
                    "value": "0"
                },
                {
                    "type": "str",
                    "name": "ty",
                    "value": "0"
                },
                {
                    "type": "str",
                    "name": "tz",
                    "value": "0"
                },
                {
                    "connection": "node_box.object",
                    "type": "object",
                    "name": "object1",
                    "value": ""
                },
                {
                    "connection": "node_box1.object",
                    "type": "object",
                    "name": "object2",
                    "value": ""
                },
                {
                    "connection": "node_box0.object",
                    "type": "object",
                    "name": "object3",
                    "value": ""
                },
                {
                    "type": "object",
                    "name": "object4",
                    "value": ""
                },
                {
                    "type": "object",
                    "name": "object5",
                    "value": ""
                },
                {
                    "type": "object",
                    "name": "object6",
                    "value": ""
                },
                {
                    "type": "object",
                    "name": "object7",
                    "value": ""
                },
                {
                    "type": "object",
                    "name": "object8",
                    "value": ""
                }
            ],
            "typename": "Node_boolean",
            "version": 1,
            "y": -26.03685999999996,
            "x": -629.0440800000001
        },
        {
            "name": "param_10",
            "inputplugs": [
                {
                    "type": "param",
                    "name": "previousparam",
                    "value": ""
                },
                {
                    "type": "str",
                    "name": "name",
                    "value": "x"
                },
                {
                    "type": "str",
                    "name": "string",
                    "value": "20"
                }
            ],
            "typename": "Node_param",
            "version": 1,
            "y": -322.0792578124998,
            "x": -1738.1237109375002
        },
        {
            "name": "node_param",
            "inputplugs": [
                {
                    "connection": "param_10.nextparam",
                    "type": "param",
                    "name": "previousparam",
                    "value": ""
                },
                {
                    "type": "str",
                    "name": "name",
                    "value": "y"
                },
                {
                    "type": "str",
                    "name": "string",
                    "value": "30"
                }
            ],
            "typename": "Node_param",
            "version": 1,
            "y": -163.7547999999999,
            "x": -1735.9660000000003
        },
        {
            "name": "node_param0",
            "inputplugs": [
                {
                    "connection": "node_param.nextparam",
                    "type": "param",
                    "name": "previousparam",
                    "value": ""
                },
                {
                    "type": "str",
                    "name": "name",
                    "value": "z"
                },
                {
                    "type": "str",
                    "name": "string",
                    "value": "10"
                }
            ],
            "typename": "Node_param",
            "version": 1,
            "y": -2.7819999999999325,
            "x": -1738.1412
        },
        {
            "name": "node_param1",
            "inputplugs": [
                {
                    "connection": "node_param0.nextparam",
                    "type": "param",
                    "name": "previousparam",
                    "value": ""
                },
                {
                    "type": "str",
                    "name": "name",
                    "value": "tickness"
                },
                {
                    "type": "str",
                    "name": "string",
                    "value": "1"
                }
            ],
            "typename": "Node_param",
            "version": 1,
            "y": 160.95560000000012,
            "x": -1739.3700000000001
        },
        {
            "name": "node_param2",
            "inputplugs": [
                {
                    "type": "param",
                    "name": "previousparam",
                    "value": ""
                },
                {
                    "type": "str",
                    "name": "name",
                    "value": "rounding"
                },
                {
                    "type": "str",
                    "name": "string",
                    "value": "5"
                }
            ],
            "typename": "Node_param",
            "version": 1,
            "y": 325.7172,
            "x": -1734.4548
        },
        {
            "name": "node_comment",
            "inputplugs": [
                {
                    "type": "str",
                    "name": "comment",
                    "value": "Design of a custom box"
                }
            ],
            "typename": "Node_comment",
            "version": 1,
            "y": -328.6093749999997,
            "x": -1059.4999999999995
        },
        {
            "name": "node_comment0",
            "inputplugs": [
                {
                    "type": "str",
                    "name": "comment",
                    "value": "this chain of param nodes defines\nthe parameter list of this module.\n"
                }
            ],
            "typename": "Node_comment",
            "version": 1,
            "y": -172.35937499999974,
            "x": -1543.2499999999995
        }
    ],
    "version": 2
}ENDGRAPHSCAD*/
